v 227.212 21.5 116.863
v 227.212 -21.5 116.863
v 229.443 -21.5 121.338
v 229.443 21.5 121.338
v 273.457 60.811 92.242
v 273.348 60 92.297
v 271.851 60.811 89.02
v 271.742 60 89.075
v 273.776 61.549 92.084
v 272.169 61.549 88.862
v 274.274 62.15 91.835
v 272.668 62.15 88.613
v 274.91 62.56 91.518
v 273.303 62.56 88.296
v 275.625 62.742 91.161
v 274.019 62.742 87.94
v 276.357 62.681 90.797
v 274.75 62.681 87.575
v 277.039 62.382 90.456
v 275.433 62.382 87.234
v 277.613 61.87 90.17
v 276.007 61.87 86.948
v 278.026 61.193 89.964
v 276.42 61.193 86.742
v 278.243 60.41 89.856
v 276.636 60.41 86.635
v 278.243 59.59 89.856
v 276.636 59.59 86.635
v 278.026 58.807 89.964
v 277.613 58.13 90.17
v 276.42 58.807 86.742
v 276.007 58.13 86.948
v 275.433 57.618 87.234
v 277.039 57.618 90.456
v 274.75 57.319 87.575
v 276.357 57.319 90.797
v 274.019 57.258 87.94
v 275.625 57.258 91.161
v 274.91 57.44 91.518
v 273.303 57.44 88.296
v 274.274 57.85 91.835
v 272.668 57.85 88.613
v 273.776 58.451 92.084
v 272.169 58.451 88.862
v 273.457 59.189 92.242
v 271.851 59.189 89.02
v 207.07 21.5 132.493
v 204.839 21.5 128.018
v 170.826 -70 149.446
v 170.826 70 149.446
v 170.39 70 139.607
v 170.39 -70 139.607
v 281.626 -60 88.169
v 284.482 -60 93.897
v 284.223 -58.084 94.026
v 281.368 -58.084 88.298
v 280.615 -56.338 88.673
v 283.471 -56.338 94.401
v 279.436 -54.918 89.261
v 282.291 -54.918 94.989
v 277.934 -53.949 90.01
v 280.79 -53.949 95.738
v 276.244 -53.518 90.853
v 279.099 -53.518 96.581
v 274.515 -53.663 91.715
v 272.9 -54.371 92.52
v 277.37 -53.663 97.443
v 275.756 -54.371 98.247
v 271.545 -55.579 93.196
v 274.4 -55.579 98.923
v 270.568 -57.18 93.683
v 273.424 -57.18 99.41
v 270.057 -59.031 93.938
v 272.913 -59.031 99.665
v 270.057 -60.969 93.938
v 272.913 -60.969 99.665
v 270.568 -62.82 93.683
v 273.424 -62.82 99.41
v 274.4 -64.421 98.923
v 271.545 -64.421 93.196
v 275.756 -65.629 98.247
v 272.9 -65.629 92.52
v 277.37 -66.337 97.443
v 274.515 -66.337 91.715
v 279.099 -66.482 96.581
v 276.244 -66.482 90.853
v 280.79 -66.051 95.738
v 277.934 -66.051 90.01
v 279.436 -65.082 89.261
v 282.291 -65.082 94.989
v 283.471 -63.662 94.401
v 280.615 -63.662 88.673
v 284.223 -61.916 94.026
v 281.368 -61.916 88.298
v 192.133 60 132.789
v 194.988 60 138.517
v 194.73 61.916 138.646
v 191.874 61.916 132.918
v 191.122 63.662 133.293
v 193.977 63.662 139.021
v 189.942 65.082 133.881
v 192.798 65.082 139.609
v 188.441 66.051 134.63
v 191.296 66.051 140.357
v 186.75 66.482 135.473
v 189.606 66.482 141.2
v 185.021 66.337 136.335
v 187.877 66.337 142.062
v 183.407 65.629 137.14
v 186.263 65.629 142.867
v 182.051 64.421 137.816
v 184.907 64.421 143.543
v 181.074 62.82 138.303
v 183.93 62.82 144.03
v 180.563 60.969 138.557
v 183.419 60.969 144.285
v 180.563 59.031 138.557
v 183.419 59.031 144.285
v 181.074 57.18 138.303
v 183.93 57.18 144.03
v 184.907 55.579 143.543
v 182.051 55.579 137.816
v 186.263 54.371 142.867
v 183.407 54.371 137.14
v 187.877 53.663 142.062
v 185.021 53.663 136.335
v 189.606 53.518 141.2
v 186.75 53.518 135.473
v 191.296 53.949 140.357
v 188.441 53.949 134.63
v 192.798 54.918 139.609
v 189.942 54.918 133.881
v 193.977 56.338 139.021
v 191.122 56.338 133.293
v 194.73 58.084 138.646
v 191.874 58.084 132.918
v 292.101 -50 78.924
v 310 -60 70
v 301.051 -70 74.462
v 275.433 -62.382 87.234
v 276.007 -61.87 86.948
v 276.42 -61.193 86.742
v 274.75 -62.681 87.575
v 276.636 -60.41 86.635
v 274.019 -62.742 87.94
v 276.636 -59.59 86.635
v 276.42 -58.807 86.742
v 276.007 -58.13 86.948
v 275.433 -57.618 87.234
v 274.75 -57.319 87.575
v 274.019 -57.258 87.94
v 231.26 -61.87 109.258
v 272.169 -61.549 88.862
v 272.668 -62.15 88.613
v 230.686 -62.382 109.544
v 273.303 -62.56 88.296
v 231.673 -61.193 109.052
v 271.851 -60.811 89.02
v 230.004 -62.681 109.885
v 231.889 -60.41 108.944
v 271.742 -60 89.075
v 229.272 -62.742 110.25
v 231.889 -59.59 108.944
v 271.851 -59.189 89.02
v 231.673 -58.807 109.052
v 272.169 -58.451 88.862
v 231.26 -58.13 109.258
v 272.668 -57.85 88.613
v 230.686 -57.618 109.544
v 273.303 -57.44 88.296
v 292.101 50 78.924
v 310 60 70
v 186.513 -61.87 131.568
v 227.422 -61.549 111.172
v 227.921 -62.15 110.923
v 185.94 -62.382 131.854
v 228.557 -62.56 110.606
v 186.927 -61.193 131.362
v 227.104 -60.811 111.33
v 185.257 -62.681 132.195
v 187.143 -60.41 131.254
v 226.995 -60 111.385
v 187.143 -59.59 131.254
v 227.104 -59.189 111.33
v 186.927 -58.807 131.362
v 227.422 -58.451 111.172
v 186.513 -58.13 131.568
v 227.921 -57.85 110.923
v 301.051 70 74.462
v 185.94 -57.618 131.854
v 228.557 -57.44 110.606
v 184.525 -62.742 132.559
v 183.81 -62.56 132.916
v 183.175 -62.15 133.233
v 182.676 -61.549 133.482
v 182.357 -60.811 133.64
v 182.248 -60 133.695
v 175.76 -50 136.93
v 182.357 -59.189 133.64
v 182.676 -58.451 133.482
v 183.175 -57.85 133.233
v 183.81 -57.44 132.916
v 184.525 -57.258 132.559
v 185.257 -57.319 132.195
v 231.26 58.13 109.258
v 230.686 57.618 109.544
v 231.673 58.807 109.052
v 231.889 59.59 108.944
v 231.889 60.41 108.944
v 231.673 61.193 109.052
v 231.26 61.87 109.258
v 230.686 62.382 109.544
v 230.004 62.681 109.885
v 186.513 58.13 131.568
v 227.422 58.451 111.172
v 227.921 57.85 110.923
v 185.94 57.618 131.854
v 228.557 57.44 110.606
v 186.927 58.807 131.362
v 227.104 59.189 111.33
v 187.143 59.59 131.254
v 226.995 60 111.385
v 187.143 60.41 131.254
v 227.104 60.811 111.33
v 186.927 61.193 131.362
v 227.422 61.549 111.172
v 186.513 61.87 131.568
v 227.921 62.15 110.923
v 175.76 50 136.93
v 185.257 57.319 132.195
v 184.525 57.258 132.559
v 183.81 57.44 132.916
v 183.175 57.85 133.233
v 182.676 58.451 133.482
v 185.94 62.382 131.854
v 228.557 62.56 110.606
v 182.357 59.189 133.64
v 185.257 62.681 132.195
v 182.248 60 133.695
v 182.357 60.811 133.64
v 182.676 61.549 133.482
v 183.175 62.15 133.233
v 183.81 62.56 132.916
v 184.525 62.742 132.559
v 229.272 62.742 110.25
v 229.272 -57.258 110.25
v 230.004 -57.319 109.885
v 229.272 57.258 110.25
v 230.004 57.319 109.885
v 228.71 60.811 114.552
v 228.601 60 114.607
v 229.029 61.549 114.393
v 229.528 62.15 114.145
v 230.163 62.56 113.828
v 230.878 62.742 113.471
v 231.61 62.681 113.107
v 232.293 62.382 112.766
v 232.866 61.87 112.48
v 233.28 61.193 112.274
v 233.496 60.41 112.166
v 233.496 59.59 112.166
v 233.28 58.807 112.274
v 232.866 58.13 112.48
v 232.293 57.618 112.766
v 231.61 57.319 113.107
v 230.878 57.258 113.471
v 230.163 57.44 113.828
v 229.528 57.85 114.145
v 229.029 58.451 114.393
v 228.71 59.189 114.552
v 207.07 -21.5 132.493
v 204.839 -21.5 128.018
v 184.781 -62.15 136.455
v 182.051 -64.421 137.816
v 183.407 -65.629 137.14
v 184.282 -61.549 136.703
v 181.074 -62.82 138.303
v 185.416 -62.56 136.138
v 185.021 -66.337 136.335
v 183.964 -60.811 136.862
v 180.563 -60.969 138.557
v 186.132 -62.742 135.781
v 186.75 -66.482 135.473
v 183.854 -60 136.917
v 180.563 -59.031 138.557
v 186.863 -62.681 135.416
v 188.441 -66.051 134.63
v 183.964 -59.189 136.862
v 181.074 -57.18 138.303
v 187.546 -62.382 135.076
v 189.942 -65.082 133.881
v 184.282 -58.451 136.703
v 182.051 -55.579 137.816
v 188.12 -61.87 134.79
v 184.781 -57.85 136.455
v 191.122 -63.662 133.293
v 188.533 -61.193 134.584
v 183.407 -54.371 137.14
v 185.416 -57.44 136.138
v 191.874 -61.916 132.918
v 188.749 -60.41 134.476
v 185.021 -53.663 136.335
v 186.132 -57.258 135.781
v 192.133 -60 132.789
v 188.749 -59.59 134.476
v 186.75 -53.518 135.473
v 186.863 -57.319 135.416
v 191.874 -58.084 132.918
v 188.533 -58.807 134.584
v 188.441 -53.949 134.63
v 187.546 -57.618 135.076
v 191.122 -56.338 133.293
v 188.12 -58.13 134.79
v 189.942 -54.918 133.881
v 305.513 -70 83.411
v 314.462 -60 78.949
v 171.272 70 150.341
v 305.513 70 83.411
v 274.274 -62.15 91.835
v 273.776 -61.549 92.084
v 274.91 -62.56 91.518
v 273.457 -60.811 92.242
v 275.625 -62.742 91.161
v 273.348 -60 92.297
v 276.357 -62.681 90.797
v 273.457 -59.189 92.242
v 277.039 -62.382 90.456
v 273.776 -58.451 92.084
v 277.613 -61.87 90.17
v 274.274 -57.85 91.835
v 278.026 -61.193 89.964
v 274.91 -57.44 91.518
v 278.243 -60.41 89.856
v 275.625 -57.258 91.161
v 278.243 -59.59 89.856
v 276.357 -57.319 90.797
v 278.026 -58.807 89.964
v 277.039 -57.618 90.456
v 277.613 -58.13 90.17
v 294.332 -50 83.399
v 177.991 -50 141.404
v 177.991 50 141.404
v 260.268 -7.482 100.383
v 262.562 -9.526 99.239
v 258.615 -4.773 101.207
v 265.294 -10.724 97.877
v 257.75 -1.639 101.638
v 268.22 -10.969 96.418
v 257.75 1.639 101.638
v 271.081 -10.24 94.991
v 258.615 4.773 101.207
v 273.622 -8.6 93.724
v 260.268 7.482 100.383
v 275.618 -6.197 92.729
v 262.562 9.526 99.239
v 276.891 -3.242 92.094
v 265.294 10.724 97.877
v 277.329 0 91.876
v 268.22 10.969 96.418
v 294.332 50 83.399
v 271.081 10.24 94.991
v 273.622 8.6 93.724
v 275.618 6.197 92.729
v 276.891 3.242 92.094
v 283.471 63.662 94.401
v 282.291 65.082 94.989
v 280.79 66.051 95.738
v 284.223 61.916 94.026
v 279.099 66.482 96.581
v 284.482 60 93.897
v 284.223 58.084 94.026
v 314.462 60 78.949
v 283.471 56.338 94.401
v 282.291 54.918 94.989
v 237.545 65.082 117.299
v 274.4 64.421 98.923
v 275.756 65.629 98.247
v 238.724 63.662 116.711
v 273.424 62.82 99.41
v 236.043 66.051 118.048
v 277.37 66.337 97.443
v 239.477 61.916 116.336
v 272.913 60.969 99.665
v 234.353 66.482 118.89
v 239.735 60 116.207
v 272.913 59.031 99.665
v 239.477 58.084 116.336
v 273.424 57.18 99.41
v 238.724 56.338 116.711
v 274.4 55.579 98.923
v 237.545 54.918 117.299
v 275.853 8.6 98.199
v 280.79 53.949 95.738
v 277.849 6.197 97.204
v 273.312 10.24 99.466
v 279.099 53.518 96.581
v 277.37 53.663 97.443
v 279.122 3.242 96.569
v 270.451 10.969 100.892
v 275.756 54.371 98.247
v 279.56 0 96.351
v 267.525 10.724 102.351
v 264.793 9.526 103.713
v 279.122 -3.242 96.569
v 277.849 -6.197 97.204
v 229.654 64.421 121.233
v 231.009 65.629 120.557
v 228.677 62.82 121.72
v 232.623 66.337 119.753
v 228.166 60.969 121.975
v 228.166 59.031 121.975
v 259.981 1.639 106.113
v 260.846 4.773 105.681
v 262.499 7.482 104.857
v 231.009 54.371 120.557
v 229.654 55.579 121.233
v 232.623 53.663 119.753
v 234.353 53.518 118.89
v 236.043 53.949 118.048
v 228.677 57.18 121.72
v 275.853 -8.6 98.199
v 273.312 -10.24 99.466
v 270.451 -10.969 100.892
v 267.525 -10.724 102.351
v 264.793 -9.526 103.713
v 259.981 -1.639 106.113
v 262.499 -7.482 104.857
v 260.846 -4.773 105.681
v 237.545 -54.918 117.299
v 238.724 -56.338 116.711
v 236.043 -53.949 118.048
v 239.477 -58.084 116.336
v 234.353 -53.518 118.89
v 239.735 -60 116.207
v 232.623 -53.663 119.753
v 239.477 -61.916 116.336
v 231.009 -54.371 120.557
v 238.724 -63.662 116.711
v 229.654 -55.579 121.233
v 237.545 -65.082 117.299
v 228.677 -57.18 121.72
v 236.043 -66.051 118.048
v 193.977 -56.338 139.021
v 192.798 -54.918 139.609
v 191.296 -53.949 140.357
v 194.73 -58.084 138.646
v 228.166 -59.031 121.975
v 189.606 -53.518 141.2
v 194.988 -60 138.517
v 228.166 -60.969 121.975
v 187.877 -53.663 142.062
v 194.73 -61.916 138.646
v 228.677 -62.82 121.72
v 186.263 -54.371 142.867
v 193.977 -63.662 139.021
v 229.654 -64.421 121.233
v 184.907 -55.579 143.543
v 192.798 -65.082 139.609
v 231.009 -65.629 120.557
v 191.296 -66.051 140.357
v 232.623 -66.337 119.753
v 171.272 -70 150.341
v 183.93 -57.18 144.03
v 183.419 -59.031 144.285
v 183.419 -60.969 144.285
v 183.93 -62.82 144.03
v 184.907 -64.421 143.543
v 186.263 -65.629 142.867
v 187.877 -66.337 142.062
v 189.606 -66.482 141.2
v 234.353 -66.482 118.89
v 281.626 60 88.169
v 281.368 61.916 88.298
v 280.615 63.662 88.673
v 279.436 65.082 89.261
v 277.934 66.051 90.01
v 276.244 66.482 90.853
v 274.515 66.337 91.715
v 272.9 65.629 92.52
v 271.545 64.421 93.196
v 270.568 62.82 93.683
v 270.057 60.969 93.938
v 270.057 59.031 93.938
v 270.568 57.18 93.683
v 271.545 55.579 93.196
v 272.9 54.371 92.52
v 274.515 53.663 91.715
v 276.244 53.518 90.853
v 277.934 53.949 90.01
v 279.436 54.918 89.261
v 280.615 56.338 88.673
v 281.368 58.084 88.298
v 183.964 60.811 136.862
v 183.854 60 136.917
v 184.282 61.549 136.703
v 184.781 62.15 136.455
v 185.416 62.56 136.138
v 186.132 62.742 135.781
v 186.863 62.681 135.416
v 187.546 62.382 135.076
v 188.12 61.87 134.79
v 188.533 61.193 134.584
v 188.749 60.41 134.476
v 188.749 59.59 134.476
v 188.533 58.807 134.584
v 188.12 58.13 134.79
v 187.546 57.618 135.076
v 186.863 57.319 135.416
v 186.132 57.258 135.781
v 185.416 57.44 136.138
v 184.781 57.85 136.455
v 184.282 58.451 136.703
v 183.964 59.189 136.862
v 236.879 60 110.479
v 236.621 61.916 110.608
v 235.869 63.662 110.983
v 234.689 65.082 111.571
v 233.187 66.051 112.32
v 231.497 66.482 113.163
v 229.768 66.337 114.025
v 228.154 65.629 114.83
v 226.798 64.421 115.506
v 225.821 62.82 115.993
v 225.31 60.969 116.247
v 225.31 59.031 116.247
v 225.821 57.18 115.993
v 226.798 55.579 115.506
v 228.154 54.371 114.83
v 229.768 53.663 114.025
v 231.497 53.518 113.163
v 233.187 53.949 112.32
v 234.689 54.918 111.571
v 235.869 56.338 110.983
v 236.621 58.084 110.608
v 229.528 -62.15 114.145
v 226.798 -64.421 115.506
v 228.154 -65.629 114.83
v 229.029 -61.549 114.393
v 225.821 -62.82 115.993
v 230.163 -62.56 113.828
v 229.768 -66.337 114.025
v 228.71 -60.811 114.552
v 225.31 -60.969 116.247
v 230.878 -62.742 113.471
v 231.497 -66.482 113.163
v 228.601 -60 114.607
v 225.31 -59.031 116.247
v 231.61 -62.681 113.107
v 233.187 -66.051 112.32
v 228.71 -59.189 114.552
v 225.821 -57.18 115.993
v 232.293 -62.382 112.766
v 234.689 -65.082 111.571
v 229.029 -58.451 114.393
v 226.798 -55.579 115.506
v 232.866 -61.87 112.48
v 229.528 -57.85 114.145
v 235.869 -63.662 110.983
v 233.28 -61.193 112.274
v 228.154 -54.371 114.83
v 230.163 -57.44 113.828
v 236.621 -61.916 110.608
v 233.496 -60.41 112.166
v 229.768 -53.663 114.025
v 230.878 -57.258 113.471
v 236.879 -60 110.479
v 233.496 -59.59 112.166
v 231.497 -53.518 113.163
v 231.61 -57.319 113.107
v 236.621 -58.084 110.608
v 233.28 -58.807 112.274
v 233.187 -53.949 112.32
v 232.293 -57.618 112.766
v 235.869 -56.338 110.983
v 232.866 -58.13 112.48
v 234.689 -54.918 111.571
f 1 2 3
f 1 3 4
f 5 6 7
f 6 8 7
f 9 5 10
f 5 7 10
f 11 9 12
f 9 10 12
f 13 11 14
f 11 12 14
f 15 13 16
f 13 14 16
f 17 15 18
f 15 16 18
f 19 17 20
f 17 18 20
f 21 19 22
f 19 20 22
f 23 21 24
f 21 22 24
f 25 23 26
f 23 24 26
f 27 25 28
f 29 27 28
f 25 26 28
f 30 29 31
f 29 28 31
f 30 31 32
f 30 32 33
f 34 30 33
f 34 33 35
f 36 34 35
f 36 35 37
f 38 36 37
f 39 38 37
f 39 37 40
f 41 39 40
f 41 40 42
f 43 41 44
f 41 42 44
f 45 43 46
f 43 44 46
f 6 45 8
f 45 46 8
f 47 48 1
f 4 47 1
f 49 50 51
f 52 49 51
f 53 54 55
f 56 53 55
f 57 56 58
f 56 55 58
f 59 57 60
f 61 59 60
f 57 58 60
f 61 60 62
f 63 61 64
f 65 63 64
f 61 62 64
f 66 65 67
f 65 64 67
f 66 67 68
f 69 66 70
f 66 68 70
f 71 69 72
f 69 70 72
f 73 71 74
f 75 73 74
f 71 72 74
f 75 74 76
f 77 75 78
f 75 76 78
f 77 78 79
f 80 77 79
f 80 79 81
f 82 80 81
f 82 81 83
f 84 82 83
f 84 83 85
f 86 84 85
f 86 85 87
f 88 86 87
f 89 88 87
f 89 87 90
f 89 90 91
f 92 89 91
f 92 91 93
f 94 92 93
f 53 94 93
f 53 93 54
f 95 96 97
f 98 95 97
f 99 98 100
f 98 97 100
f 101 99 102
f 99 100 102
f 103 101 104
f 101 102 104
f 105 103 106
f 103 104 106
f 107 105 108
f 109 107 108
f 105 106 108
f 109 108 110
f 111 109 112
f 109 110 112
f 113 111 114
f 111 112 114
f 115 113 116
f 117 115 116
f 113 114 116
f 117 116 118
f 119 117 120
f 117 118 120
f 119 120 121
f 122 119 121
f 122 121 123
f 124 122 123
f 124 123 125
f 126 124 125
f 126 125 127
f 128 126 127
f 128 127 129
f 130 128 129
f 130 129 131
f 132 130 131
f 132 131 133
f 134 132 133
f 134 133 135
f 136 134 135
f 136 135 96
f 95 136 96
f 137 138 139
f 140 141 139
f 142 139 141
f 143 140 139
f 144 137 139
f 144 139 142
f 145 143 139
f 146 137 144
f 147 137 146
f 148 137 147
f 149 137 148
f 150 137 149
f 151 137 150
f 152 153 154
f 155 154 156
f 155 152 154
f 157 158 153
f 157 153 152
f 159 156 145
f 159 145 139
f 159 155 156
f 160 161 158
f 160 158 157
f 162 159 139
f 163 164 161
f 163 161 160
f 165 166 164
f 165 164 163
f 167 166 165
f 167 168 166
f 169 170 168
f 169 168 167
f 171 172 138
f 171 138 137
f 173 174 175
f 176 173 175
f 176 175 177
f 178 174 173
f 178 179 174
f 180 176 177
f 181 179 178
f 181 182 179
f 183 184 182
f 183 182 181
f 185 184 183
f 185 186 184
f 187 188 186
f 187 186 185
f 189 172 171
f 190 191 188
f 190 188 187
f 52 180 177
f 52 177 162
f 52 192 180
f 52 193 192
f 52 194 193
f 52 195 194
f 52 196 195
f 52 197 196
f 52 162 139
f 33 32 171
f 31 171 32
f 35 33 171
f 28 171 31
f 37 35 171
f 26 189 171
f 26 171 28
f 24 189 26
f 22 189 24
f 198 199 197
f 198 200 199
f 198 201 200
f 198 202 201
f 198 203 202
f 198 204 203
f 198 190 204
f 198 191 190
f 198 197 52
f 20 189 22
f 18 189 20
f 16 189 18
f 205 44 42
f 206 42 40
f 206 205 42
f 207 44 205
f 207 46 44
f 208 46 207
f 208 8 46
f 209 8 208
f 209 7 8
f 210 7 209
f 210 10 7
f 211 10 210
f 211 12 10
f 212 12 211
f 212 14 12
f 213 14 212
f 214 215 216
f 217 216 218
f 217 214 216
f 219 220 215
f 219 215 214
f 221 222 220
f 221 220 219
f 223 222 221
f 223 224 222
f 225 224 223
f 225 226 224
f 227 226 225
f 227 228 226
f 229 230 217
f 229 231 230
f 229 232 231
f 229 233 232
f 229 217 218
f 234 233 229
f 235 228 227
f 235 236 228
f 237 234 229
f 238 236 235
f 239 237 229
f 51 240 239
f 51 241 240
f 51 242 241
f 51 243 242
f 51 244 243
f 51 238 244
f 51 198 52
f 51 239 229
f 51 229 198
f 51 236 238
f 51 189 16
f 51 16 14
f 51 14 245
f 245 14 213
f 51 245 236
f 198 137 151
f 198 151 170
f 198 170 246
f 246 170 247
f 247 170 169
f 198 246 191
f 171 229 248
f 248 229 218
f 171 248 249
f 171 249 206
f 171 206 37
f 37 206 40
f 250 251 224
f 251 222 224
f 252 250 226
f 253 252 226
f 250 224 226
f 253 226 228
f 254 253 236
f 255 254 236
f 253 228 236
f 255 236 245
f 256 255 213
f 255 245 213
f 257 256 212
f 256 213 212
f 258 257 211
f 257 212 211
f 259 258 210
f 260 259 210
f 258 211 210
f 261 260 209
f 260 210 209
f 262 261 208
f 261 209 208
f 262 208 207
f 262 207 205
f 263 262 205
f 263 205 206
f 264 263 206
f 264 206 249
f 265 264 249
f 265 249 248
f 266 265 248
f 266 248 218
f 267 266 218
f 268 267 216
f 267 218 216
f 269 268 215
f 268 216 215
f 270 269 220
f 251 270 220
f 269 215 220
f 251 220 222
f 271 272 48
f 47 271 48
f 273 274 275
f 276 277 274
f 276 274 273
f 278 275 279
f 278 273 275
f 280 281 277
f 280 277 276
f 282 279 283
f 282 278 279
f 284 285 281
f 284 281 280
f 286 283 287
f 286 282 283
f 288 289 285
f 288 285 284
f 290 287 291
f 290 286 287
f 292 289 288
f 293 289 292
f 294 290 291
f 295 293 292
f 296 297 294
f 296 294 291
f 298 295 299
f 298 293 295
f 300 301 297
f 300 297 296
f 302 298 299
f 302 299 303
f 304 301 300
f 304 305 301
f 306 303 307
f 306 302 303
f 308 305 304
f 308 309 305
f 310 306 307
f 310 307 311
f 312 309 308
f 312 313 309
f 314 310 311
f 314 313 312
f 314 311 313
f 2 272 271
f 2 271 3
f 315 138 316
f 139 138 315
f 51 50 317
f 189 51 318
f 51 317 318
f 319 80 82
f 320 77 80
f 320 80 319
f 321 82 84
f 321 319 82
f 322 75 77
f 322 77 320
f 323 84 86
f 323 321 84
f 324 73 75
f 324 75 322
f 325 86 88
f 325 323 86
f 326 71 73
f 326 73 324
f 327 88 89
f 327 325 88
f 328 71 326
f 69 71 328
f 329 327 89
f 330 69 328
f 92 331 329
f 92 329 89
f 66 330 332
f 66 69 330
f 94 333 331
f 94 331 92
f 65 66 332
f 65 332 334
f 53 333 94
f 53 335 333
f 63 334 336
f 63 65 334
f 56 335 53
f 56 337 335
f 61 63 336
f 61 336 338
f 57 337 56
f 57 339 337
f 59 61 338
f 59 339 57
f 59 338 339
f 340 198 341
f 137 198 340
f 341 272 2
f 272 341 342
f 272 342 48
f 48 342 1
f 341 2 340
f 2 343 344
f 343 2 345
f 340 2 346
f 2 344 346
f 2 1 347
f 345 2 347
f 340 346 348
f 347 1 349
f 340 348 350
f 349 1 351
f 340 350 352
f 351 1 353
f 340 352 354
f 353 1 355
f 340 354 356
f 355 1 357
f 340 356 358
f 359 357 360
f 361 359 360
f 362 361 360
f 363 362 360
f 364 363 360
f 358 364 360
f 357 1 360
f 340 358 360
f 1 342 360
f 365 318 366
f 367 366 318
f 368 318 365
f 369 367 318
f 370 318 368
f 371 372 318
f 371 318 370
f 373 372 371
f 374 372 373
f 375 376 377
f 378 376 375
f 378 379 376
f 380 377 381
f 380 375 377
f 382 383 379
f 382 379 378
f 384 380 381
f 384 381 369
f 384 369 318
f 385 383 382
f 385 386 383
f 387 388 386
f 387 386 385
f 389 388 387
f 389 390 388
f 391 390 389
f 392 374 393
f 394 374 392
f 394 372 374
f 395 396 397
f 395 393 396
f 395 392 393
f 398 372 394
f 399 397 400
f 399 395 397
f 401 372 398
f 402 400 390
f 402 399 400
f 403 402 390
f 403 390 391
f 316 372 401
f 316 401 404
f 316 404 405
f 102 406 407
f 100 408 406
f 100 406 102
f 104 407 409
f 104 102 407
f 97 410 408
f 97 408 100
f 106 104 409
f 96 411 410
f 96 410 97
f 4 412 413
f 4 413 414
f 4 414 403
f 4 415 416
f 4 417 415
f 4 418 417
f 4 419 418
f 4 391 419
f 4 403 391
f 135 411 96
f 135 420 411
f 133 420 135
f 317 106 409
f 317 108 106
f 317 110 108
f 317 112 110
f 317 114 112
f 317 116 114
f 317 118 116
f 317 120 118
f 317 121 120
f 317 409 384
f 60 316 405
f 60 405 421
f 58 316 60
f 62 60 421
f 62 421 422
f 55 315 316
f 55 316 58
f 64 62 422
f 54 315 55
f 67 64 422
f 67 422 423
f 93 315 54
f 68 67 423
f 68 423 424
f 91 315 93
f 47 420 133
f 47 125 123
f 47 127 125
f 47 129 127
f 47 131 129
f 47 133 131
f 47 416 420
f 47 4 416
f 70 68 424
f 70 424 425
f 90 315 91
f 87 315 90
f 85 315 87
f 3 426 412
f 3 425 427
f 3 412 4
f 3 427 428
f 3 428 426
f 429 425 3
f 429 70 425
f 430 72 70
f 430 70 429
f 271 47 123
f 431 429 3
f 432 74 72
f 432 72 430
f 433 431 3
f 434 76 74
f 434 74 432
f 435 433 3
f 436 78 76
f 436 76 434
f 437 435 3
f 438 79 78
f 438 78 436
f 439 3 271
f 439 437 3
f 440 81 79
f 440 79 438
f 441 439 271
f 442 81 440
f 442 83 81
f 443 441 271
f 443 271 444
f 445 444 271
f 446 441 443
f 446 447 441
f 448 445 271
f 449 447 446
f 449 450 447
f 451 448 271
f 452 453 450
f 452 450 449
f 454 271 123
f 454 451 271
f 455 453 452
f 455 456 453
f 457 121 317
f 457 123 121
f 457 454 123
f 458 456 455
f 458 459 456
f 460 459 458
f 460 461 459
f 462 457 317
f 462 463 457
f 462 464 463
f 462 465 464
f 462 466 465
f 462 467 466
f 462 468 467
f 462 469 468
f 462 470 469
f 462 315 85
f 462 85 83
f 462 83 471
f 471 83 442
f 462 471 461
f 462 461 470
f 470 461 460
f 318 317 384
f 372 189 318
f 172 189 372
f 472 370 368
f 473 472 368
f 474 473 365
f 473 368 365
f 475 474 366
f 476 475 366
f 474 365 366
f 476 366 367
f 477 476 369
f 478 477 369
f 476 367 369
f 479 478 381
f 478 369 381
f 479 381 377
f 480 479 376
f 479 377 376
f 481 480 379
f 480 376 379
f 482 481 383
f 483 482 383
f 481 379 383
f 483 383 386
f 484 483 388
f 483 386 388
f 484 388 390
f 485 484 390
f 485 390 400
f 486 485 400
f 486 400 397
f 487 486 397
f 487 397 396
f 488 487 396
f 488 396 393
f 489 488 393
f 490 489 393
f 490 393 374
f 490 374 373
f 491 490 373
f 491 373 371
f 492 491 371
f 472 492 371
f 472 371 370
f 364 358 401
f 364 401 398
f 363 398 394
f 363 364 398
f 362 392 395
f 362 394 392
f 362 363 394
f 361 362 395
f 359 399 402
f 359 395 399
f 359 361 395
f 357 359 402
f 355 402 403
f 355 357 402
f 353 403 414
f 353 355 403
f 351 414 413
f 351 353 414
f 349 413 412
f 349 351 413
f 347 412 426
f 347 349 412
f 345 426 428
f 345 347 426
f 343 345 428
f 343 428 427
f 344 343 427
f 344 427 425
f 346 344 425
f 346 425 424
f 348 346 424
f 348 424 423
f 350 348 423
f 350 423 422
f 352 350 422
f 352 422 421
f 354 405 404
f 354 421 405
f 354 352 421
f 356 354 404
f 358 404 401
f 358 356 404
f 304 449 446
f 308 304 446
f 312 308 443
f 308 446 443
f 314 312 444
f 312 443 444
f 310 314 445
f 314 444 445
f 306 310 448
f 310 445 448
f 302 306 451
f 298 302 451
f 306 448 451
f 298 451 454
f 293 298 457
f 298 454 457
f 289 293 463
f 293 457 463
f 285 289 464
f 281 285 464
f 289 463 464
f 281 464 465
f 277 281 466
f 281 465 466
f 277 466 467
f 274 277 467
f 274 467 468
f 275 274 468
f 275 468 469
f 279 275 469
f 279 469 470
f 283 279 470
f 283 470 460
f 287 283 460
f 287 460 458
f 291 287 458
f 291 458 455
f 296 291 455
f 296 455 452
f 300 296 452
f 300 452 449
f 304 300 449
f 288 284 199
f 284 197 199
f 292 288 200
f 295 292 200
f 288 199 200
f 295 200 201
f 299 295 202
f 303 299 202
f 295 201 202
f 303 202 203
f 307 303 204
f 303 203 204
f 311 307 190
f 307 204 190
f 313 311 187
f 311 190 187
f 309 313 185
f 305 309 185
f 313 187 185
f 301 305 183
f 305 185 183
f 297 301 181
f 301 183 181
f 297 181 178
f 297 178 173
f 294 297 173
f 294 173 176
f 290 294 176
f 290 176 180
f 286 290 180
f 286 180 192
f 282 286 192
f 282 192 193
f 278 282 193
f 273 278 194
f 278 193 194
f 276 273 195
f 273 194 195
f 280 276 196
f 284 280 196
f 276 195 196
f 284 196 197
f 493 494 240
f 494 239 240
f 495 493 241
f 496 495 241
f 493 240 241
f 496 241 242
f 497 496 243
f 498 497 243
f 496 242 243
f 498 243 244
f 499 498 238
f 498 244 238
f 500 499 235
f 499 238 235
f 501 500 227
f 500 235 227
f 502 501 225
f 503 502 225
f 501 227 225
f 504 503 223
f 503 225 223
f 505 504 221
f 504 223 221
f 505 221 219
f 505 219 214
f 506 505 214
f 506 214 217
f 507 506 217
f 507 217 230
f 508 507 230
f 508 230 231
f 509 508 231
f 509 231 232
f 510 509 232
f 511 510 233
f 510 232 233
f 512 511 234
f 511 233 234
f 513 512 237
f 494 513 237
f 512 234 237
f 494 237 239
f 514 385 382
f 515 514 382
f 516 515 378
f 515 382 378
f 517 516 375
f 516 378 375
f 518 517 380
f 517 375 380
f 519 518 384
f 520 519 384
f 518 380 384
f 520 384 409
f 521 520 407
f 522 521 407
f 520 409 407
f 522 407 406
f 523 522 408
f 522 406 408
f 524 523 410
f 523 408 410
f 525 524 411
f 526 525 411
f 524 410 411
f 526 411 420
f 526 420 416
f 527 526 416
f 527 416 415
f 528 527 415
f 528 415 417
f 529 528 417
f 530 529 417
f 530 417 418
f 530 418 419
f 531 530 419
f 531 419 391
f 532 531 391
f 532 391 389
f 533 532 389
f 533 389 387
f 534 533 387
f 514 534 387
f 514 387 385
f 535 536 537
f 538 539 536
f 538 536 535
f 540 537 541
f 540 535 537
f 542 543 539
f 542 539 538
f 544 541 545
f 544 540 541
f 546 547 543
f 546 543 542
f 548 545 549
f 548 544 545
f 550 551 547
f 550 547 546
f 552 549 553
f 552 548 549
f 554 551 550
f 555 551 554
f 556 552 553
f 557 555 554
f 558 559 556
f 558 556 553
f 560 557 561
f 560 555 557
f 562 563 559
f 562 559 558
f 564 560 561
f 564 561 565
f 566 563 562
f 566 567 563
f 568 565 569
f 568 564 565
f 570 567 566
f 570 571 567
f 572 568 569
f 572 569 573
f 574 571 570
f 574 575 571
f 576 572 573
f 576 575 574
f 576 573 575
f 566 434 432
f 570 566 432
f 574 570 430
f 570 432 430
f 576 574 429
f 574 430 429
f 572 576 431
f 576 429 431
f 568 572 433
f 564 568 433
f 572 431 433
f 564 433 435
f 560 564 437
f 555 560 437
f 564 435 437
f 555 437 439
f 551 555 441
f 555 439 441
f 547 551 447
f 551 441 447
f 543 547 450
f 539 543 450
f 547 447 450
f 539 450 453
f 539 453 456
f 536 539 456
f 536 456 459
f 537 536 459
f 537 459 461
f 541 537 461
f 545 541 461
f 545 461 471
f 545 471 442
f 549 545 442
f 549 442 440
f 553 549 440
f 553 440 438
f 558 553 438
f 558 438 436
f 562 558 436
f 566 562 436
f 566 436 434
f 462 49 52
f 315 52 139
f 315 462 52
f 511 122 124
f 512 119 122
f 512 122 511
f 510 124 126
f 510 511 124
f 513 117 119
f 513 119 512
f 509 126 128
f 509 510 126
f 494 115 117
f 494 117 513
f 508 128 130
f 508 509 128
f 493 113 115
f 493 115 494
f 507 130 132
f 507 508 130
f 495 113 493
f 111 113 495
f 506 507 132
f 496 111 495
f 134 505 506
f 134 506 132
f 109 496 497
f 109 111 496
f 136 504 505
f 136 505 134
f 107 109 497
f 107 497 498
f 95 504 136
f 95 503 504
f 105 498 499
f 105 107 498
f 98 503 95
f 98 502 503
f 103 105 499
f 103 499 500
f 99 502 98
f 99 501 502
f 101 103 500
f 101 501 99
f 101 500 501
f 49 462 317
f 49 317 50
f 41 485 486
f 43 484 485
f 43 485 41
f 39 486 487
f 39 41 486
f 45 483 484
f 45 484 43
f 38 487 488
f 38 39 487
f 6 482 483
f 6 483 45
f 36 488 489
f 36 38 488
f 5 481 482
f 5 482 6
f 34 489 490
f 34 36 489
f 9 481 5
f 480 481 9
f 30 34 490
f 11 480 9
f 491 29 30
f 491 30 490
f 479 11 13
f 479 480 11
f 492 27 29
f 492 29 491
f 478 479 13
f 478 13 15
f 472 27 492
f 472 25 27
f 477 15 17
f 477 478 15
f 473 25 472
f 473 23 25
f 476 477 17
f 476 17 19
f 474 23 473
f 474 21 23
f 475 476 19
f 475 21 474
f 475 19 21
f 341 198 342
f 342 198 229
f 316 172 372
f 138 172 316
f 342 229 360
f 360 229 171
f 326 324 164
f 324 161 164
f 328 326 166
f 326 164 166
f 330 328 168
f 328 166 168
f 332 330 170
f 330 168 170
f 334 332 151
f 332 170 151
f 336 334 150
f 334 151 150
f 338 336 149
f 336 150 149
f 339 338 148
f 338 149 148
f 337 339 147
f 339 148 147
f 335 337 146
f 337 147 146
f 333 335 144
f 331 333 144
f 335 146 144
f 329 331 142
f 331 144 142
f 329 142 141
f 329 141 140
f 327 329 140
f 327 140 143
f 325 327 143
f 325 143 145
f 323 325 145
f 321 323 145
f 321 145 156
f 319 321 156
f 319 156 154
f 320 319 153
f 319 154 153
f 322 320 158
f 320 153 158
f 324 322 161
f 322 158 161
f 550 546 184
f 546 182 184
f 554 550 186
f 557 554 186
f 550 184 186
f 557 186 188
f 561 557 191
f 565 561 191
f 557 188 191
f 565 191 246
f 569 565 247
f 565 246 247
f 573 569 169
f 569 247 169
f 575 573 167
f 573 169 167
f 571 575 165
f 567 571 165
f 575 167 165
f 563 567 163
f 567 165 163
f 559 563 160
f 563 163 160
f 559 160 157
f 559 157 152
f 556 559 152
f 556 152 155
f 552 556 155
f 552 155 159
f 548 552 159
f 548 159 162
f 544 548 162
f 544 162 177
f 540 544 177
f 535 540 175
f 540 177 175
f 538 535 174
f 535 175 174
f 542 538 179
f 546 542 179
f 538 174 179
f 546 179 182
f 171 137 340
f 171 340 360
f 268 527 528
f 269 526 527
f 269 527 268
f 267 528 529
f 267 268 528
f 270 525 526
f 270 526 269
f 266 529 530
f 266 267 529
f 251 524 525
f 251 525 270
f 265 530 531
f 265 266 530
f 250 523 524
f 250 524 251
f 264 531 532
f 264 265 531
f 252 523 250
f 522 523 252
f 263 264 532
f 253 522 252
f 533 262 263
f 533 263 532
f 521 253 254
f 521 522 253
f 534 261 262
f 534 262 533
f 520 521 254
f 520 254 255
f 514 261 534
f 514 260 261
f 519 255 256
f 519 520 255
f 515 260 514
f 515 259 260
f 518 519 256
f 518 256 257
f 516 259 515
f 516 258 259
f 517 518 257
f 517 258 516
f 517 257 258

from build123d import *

# Parameters (mm, degrees)
PAD008_DEPTH            = 10
HOLE007_D               = 5.5
HOLE007_DEPTH           = 25
HOLE007_CBORE_D         = 13
HOLE007_CBORE_DEPTH     = 6.4
SKETCH024_W             = 130
SKETCH024_H             = 100
POCKET006_DEPTH         = 5
SKETCH025_W             = 25
SKETCH025_H             = 43
POCKET007_DEPTH         = 21
SKETCH026_R             = 11
POCKET008_DEPTH         = 12
PAD009_DEPTH            = 140
BODY004_PLACEMENT_ANGLE = 333.5


with BuildPart() as part:
    # Sketch022 → Pad008 (new body)
    with BuildSketch(Plane.XY):
        Polygon((0, 60), (0, -60), (-10, -70), (-156, -70), (-156, 70), (-10, 70), align=None)
    extrude(amount=PAD008_DEPTH)

    # Hole007
    with Locations(Plane.XY.offset(10)):
        with Locations((-140, 60), (-140, -60), (-90, -60), (-90, 60), (-40, 60), (-40, -60)):
            CounterBoreHole(HOLE007_D / 2, HOLE007_CBORE_D / 2, HOLE007_CBORE_DEPTH, depth=HOLE007_DEPTH)

    # Sketch024 → Pocket006 (cut)
    with BuildSketch(Plane.XY):
        with Locations((-85, 0)):
            Rectangle(SKETCH024_W, SKETCH024_H)
    extrude(amount=POCKET006_DEPTH, mode=Mode.SUBTRACT)

    # Sketch025 → Pocket007 (cut)
    with BuildSketch(Plane.XY):
        with Locations((-107.5, 0)):
            Rectangle(SKETCH025_W, SKETCH025_H)
    extrude(amount=POCKET007_DEPTH, mode=Mode.SUBTRACT)

    # Sketch026 → Pocket008 (cut)
    with BuildSketch(Plane.XY):
        with Locations((-50, 0)):
            Circle(SKETCH026_R)
    extrude(amount=POCKET008_DEPTH, mode=Mode.SUBTRACT)

    # Sketch027 → Pad009 (join)
    with BuildSketch(Plane.XZ.offset(70)):
        Polygon((-156, 10), (-160, 10), (-160, 9), (-156, 0), align=None)
    extrude(amount=-PAD009_DEPTH)


with BuildPart() as part_1:
    # Body004 placement: moved
    add(part.part.moved(Location((310, 0, 70))).rotate(Axis((310, 0, 70), (0, -1, 0)), BODY004_PLACEMENT_ANGLE))


solid = part_1.part
